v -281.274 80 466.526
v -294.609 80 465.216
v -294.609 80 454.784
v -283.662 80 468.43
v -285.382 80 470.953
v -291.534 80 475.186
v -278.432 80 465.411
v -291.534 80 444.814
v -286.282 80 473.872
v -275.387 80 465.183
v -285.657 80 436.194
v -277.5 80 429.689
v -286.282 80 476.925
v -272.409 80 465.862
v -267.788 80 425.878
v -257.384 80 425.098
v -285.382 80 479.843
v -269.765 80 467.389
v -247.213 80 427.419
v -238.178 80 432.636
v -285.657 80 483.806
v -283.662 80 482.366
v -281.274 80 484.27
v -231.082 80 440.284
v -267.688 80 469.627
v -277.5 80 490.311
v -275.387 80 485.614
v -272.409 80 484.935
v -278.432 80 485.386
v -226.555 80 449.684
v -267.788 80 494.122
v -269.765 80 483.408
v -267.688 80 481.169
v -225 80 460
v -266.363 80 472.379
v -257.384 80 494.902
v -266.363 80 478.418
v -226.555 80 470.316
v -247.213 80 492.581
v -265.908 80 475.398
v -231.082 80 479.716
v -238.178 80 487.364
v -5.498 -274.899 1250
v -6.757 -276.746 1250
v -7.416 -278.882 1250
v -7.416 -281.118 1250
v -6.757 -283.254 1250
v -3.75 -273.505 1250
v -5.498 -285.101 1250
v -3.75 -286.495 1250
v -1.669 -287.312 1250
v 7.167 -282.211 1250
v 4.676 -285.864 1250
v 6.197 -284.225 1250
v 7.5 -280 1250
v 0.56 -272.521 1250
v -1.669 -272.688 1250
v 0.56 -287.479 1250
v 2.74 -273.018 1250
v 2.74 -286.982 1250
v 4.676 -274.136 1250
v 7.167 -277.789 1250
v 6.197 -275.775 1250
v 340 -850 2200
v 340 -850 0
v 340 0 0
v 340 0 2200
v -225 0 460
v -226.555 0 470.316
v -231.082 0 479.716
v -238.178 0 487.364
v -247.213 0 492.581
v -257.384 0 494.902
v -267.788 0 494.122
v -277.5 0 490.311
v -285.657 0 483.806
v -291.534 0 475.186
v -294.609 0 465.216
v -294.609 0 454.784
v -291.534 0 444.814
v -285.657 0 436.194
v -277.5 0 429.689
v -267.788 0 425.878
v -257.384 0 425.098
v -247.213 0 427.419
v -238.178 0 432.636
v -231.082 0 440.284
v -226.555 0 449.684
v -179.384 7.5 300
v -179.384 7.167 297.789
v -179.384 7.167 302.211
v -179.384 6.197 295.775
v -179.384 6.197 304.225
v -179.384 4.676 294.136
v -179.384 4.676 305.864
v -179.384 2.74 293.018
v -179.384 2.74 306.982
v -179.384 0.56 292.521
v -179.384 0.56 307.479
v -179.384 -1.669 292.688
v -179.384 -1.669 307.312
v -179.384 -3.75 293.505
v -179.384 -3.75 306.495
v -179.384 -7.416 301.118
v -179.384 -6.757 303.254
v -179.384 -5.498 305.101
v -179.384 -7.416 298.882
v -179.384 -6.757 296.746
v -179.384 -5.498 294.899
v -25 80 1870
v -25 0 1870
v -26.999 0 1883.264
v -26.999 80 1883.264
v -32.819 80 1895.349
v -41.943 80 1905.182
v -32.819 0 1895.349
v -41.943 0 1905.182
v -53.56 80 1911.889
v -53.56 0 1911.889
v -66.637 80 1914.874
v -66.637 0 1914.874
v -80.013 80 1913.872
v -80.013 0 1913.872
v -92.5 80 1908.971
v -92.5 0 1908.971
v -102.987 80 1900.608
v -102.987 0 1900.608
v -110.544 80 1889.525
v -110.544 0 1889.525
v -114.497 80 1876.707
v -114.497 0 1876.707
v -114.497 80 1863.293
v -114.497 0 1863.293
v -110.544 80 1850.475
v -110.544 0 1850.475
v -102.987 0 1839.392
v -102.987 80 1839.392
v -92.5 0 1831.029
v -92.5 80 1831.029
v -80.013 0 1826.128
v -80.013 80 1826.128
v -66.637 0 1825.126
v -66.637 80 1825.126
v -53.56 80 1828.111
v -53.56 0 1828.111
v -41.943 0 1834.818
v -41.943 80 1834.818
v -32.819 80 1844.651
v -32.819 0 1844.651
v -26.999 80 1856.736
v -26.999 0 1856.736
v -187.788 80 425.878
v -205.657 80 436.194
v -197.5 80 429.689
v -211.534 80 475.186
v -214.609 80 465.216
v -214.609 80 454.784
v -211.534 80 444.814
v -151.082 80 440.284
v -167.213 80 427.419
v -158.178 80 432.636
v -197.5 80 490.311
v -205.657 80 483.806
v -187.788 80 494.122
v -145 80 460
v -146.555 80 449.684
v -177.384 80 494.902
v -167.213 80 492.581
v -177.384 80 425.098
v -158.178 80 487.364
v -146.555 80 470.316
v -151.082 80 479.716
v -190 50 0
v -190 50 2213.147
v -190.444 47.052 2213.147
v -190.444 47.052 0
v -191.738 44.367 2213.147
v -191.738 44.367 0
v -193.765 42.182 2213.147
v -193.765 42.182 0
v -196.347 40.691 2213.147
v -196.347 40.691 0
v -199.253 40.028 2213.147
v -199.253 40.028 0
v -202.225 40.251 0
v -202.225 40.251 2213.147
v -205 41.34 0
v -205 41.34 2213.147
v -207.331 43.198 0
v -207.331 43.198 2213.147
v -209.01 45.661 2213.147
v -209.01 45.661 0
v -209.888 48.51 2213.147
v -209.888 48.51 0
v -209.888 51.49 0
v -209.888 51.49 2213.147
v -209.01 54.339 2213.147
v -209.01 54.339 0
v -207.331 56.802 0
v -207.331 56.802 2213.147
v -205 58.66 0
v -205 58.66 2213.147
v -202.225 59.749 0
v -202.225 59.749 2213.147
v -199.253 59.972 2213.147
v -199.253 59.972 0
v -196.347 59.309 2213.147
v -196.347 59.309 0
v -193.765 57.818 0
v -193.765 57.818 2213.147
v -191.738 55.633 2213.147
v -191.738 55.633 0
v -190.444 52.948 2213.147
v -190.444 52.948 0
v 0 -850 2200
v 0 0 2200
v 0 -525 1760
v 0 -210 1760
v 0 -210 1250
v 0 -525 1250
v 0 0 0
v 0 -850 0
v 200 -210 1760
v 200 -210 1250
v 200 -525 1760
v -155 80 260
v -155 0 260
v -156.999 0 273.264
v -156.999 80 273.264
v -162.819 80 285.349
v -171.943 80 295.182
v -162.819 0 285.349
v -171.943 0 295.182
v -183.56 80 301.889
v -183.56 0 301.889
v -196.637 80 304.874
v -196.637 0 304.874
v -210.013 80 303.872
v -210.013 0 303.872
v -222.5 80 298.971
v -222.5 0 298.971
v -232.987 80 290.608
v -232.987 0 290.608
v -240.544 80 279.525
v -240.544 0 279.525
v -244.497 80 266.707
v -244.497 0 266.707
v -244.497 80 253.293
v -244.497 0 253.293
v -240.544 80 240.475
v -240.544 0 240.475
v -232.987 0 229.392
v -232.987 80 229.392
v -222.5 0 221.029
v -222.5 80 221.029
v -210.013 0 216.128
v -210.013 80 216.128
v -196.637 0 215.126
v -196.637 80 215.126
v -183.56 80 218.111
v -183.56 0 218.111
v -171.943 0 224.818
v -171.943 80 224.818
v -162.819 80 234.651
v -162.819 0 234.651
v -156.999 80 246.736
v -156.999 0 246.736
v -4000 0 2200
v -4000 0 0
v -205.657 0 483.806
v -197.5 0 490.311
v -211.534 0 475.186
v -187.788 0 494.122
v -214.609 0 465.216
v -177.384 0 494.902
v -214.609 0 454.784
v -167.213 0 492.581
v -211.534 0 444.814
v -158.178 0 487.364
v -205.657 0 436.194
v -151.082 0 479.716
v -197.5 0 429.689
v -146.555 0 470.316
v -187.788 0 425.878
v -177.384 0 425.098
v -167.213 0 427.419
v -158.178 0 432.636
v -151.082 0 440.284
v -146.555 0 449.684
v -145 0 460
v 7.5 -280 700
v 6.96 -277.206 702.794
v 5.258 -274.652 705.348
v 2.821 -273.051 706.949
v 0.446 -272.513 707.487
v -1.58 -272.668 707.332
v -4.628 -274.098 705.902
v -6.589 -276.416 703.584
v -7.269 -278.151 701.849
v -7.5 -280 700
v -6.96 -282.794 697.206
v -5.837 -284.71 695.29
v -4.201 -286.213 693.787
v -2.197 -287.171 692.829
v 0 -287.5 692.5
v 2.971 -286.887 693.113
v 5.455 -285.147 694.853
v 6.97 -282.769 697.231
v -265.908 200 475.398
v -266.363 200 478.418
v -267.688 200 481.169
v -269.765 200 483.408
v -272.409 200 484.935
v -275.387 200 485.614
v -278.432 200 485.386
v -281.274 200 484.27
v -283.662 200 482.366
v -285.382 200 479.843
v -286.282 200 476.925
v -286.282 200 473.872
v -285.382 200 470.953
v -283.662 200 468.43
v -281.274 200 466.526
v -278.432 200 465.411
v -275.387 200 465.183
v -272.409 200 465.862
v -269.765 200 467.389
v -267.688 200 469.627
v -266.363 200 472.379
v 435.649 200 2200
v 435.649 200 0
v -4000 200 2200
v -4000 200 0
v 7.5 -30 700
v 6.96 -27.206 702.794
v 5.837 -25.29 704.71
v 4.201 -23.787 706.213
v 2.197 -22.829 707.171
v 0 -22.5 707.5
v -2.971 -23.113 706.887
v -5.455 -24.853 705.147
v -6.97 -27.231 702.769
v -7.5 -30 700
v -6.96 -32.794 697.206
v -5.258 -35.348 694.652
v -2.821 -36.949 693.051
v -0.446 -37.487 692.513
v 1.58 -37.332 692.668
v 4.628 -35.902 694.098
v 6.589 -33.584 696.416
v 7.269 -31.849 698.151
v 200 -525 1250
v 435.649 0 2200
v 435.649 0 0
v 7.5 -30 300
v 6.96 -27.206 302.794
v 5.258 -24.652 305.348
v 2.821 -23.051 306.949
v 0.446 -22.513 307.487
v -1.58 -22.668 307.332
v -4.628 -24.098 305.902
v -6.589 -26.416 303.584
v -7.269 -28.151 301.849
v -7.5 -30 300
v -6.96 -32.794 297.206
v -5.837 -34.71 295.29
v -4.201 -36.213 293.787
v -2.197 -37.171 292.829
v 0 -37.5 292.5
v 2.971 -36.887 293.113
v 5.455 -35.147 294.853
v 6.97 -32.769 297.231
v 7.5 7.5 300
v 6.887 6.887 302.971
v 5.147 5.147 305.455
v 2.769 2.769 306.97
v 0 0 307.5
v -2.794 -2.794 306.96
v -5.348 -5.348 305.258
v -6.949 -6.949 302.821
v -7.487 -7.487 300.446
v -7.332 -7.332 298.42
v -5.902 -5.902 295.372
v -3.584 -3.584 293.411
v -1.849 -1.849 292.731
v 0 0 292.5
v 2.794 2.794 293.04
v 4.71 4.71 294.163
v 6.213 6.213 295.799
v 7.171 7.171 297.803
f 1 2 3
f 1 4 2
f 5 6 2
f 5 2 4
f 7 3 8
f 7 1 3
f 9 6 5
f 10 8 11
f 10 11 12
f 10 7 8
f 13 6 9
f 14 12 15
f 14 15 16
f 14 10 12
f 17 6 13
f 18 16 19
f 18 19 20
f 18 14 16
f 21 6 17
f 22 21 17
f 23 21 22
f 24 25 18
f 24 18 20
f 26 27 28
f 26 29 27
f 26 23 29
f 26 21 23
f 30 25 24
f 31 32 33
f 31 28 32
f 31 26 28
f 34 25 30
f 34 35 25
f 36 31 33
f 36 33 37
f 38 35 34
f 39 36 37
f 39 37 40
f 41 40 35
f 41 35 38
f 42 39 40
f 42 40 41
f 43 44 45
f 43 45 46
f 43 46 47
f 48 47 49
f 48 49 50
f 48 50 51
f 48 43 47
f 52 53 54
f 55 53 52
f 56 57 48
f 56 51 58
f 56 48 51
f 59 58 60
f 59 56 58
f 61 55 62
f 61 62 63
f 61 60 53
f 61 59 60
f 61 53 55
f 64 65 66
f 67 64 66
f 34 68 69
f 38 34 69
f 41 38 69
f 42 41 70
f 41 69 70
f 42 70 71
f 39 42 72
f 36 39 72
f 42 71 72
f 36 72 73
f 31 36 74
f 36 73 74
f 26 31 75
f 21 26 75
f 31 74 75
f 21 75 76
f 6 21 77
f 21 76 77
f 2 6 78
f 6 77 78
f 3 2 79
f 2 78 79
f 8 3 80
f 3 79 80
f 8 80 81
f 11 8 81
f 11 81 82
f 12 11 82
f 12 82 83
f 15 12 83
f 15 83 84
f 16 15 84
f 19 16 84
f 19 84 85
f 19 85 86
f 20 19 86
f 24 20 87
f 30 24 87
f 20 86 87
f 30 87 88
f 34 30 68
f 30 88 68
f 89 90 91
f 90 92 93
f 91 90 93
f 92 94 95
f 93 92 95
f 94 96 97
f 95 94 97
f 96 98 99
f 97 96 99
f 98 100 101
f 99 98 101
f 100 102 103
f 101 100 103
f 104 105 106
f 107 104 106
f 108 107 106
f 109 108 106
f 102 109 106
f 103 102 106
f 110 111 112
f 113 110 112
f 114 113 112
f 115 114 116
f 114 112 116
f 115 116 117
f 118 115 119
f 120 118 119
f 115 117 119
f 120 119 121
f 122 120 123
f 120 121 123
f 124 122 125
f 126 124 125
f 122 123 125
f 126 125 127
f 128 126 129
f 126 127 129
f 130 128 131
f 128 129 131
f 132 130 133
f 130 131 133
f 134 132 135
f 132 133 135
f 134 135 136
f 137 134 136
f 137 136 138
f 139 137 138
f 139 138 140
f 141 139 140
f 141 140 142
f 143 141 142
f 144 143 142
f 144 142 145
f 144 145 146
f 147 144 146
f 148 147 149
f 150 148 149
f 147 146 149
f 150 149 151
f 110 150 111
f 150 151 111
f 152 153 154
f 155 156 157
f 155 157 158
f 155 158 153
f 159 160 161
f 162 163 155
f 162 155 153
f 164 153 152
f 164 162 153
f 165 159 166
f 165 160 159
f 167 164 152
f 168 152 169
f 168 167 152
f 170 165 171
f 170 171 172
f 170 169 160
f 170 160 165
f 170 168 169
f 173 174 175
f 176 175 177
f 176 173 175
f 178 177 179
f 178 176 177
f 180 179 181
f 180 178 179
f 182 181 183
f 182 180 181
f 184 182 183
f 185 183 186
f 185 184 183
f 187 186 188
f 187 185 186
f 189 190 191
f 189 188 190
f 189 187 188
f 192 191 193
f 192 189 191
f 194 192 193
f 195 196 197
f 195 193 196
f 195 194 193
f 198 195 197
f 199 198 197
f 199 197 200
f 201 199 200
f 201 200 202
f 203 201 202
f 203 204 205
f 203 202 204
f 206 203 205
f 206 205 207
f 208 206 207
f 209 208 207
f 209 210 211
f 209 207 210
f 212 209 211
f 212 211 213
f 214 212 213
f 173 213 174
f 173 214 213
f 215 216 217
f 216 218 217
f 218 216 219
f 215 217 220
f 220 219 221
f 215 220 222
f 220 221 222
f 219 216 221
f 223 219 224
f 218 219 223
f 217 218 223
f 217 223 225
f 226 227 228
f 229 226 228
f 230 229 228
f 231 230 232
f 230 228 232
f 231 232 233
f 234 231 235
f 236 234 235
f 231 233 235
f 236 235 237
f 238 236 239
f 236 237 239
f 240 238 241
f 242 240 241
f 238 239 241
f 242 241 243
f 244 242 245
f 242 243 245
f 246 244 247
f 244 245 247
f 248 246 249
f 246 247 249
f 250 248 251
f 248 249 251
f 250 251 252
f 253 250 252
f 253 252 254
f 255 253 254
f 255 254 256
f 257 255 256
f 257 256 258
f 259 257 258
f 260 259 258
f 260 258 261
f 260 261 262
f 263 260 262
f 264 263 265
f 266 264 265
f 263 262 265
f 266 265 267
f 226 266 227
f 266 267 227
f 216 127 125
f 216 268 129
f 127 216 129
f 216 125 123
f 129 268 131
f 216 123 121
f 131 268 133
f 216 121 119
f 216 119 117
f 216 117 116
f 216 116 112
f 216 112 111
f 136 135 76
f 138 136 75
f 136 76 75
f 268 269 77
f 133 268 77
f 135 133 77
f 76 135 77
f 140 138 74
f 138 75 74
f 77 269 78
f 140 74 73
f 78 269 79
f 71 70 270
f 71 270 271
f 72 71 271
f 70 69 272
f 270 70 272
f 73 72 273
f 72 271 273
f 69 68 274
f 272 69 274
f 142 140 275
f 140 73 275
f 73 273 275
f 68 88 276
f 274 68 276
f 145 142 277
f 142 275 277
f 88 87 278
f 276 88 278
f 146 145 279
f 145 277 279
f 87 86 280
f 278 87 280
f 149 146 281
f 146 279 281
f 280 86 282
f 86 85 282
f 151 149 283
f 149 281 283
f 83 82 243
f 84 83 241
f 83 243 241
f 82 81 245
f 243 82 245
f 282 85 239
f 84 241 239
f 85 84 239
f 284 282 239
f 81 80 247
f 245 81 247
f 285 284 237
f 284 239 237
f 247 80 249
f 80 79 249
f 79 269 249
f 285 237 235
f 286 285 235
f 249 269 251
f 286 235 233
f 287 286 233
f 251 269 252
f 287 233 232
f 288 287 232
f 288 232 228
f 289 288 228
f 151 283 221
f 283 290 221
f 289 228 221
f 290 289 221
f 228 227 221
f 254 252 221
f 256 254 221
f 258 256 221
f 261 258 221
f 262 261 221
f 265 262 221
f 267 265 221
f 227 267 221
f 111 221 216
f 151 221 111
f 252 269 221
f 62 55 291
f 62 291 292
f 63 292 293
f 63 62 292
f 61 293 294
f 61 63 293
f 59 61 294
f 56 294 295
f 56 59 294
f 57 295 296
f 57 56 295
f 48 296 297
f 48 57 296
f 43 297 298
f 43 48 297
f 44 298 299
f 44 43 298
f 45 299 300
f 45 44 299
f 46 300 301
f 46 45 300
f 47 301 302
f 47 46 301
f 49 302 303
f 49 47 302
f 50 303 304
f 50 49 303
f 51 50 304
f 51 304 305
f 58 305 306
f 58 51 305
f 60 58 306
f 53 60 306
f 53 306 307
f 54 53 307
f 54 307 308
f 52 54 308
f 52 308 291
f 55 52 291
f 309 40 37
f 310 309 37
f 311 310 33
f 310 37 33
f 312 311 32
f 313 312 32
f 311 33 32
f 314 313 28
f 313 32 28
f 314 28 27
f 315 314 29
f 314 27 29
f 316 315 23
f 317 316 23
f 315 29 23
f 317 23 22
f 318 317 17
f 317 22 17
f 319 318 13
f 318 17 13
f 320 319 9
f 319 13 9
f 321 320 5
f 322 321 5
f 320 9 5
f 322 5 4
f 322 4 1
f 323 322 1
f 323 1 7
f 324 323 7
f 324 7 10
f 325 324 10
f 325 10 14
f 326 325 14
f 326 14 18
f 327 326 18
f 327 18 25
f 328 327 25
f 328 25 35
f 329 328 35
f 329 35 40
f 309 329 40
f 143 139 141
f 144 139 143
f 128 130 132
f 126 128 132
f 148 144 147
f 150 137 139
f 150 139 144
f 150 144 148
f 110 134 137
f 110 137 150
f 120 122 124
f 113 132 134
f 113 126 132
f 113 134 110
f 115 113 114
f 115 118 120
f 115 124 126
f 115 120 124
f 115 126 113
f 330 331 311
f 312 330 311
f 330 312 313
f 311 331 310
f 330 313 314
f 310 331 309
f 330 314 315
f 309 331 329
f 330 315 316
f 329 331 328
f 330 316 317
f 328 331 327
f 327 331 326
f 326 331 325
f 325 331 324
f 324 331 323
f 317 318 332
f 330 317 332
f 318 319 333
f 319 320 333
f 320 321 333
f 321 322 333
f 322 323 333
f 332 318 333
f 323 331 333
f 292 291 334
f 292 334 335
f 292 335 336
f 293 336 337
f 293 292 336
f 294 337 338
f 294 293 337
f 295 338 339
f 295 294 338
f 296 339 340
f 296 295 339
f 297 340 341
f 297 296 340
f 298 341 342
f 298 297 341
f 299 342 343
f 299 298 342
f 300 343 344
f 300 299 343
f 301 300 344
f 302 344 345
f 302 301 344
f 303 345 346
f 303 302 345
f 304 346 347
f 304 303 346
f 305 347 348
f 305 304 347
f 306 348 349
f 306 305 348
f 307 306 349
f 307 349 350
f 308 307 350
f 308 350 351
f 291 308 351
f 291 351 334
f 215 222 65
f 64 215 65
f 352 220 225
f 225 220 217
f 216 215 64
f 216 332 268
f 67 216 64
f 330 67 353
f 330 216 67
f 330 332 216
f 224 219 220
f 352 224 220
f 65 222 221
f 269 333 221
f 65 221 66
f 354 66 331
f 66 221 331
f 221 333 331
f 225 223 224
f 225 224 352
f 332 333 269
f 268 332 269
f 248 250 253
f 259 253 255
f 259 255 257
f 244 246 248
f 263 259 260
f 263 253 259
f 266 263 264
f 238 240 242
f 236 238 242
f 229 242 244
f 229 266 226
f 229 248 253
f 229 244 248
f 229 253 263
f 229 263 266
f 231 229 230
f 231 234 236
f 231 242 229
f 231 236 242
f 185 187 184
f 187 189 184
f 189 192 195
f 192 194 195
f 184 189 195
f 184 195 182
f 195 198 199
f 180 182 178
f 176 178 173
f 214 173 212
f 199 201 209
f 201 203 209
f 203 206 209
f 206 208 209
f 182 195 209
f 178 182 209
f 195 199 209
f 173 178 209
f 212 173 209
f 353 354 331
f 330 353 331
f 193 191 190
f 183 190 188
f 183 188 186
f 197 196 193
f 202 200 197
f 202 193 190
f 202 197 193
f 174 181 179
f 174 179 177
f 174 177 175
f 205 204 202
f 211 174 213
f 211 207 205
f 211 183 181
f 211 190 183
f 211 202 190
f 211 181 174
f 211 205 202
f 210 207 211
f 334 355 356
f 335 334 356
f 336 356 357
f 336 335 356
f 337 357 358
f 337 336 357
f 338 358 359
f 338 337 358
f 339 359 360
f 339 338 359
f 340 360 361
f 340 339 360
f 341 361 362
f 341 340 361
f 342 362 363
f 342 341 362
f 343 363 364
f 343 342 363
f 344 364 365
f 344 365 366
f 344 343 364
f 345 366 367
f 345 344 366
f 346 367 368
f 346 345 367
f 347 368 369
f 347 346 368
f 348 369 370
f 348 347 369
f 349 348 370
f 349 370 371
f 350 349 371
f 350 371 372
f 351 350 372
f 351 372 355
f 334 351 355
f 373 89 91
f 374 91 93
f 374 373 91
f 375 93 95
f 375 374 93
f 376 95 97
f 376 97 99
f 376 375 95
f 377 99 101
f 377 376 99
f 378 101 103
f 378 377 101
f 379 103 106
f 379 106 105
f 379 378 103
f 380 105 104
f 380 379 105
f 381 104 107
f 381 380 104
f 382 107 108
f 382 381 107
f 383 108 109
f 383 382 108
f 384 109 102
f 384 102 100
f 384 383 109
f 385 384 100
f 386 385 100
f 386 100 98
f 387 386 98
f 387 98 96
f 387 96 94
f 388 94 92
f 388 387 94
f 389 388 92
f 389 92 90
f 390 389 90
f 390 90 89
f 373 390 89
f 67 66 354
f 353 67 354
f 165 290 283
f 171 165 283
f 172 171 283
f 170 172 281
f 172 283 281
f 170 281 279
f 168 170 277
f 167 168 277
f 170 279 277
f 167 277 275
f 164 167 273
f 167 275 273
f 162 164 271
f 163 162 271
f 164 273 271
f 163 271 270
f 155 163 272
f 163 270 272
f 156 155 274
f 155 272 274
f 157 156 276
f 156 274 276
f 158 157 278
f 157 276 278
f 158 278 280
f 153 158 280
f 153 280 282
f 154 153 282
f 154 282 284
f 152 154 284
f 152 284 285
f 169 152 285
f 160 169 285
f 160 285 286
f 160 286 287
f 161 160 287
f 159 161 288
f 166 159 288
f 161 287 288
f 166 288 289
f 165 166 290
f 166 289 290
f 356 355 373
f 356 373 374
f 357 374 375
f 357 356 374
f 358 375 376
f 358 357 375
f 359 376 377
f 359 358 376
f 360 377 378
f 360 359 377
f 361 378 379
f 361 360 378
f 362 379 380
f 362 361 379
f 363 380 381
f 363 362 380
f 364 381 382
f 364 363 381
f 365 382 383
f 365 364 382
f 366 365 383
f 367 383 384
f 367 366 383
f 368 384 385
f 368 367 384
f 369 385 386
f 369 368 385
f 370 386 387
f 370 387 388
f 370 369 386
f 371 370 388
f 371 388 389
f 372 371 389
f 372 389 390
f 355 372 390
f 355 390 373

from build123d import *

# Parameters (mm, degrees)
F1_DEPTH  = 2200
F2_W      = 315
F2_H      = 510
F3_DEPTH  = 200
F5_R      = 45
F5_R_2    = 35
F6_DEPTH  = 80
F8_R      = 10
F11_R     = 7.5
F13_R     = 10.2444666601
F14_DEPTH = 120.001


with BuildPart() as f1:
    # F0 (on Top) → F1 (new body)
    with BuildSketch(Plane.XY):
        Polygon((-4000, 0), (0, 0), (0, -850), (340, -850), (340, 0), (435.6485232387, 0), (435.6485232387, 200), (-4000, 200), align=None)
    extrude(amount=F1_DEPTH)

    # F2 (on face) → F3 (cut)
    with BuildSketch(Plane(origin=(0, 0, 0), x_dir=(0, -1, 0), z_dir=(-1, 0, 0))):
        with Locations((367.5, 1505)):
            Rectangle(F2_W, F2_H)
    extrude(amount=-F3_DEPTH, mode=Mode.SUBTRACT)

    # F5 (on face) → F6 (cut)
    with BuildSketch(Plane.XZ):
        with Locations((-200, 260)):
            Circle(F5_R)
        with Locations((-70, 1870)):
            Circle(F5_R)
        with Locations((-180, 460)):
            Circle(F5_R_2)
        with Locations((-260, 460)):
            Circle(F5_R_2)
    extrude(amount=-F6_DEPTH, mode=Mode.SUBTRACT)

    # F13 (on face) → F14 (cut, through all)
    with BuildSketch(Plane.XZ.offset(-80)):
        with Locations((-276.1521041393, 475.3983914852)):
            Circle(F13_R)
    extrude(amount=-F14_DEPTH, mode=Mode.SUBTRACT)


with BuildPart() as f9:
    # F9: sweep along a path in F7
    with BuildLine(Plane.XZ) as f9_path:
        Line((-200, 215), (-200, 0))
    # F8 (on Top) → F9 (sweep)
    with BuildSketch(Plane.XY):
        with Locations((-200, 50)):
            Circle(F8_R)
    sweep(path=f9_path.line)

    # F10: sweep along a path in F7
    with BuildLine(Plane.XZ) as f10_path:
        Line((-200, 305), (-200, 2518.1469917297))
    # F8 (on Top) → F10 (sweep)
    with BuildSketch(Plane.XY):
        with Locations((-200, 50)):
            Circle(F8_R)
    sweep(path=f10_path.line)


with BuildPart() as f12:
    # F12: sweep along a path in F7, F4
    with BuildLine(Plane.XZ) as f12_path:
        Line((-179.3844718719, 300), (0, 300))
    with BuildLine(Plane(origin=(0, 0, 0), x_dir=(0, -1, 0), z_dir=(-1, 0, 0))) as f12_path_2:
        Line((0, 300), (30, 300))
        Line((30, 300), (30, 700))
        Line((30, 700), (280, 700))
        Line((280, 700), (280, 1250))
    # F11 (on Right) → F12 (sweep)
    with BuildSketch(Plane.YZ):
        with Locations((0, 300)):
            Circle(F11_R)
    sweep(path=f12_path.line + f12_path_2.line, transition=Transition.RIGHT)


solid = Compound([f1.part, f9.part, f12.part])
